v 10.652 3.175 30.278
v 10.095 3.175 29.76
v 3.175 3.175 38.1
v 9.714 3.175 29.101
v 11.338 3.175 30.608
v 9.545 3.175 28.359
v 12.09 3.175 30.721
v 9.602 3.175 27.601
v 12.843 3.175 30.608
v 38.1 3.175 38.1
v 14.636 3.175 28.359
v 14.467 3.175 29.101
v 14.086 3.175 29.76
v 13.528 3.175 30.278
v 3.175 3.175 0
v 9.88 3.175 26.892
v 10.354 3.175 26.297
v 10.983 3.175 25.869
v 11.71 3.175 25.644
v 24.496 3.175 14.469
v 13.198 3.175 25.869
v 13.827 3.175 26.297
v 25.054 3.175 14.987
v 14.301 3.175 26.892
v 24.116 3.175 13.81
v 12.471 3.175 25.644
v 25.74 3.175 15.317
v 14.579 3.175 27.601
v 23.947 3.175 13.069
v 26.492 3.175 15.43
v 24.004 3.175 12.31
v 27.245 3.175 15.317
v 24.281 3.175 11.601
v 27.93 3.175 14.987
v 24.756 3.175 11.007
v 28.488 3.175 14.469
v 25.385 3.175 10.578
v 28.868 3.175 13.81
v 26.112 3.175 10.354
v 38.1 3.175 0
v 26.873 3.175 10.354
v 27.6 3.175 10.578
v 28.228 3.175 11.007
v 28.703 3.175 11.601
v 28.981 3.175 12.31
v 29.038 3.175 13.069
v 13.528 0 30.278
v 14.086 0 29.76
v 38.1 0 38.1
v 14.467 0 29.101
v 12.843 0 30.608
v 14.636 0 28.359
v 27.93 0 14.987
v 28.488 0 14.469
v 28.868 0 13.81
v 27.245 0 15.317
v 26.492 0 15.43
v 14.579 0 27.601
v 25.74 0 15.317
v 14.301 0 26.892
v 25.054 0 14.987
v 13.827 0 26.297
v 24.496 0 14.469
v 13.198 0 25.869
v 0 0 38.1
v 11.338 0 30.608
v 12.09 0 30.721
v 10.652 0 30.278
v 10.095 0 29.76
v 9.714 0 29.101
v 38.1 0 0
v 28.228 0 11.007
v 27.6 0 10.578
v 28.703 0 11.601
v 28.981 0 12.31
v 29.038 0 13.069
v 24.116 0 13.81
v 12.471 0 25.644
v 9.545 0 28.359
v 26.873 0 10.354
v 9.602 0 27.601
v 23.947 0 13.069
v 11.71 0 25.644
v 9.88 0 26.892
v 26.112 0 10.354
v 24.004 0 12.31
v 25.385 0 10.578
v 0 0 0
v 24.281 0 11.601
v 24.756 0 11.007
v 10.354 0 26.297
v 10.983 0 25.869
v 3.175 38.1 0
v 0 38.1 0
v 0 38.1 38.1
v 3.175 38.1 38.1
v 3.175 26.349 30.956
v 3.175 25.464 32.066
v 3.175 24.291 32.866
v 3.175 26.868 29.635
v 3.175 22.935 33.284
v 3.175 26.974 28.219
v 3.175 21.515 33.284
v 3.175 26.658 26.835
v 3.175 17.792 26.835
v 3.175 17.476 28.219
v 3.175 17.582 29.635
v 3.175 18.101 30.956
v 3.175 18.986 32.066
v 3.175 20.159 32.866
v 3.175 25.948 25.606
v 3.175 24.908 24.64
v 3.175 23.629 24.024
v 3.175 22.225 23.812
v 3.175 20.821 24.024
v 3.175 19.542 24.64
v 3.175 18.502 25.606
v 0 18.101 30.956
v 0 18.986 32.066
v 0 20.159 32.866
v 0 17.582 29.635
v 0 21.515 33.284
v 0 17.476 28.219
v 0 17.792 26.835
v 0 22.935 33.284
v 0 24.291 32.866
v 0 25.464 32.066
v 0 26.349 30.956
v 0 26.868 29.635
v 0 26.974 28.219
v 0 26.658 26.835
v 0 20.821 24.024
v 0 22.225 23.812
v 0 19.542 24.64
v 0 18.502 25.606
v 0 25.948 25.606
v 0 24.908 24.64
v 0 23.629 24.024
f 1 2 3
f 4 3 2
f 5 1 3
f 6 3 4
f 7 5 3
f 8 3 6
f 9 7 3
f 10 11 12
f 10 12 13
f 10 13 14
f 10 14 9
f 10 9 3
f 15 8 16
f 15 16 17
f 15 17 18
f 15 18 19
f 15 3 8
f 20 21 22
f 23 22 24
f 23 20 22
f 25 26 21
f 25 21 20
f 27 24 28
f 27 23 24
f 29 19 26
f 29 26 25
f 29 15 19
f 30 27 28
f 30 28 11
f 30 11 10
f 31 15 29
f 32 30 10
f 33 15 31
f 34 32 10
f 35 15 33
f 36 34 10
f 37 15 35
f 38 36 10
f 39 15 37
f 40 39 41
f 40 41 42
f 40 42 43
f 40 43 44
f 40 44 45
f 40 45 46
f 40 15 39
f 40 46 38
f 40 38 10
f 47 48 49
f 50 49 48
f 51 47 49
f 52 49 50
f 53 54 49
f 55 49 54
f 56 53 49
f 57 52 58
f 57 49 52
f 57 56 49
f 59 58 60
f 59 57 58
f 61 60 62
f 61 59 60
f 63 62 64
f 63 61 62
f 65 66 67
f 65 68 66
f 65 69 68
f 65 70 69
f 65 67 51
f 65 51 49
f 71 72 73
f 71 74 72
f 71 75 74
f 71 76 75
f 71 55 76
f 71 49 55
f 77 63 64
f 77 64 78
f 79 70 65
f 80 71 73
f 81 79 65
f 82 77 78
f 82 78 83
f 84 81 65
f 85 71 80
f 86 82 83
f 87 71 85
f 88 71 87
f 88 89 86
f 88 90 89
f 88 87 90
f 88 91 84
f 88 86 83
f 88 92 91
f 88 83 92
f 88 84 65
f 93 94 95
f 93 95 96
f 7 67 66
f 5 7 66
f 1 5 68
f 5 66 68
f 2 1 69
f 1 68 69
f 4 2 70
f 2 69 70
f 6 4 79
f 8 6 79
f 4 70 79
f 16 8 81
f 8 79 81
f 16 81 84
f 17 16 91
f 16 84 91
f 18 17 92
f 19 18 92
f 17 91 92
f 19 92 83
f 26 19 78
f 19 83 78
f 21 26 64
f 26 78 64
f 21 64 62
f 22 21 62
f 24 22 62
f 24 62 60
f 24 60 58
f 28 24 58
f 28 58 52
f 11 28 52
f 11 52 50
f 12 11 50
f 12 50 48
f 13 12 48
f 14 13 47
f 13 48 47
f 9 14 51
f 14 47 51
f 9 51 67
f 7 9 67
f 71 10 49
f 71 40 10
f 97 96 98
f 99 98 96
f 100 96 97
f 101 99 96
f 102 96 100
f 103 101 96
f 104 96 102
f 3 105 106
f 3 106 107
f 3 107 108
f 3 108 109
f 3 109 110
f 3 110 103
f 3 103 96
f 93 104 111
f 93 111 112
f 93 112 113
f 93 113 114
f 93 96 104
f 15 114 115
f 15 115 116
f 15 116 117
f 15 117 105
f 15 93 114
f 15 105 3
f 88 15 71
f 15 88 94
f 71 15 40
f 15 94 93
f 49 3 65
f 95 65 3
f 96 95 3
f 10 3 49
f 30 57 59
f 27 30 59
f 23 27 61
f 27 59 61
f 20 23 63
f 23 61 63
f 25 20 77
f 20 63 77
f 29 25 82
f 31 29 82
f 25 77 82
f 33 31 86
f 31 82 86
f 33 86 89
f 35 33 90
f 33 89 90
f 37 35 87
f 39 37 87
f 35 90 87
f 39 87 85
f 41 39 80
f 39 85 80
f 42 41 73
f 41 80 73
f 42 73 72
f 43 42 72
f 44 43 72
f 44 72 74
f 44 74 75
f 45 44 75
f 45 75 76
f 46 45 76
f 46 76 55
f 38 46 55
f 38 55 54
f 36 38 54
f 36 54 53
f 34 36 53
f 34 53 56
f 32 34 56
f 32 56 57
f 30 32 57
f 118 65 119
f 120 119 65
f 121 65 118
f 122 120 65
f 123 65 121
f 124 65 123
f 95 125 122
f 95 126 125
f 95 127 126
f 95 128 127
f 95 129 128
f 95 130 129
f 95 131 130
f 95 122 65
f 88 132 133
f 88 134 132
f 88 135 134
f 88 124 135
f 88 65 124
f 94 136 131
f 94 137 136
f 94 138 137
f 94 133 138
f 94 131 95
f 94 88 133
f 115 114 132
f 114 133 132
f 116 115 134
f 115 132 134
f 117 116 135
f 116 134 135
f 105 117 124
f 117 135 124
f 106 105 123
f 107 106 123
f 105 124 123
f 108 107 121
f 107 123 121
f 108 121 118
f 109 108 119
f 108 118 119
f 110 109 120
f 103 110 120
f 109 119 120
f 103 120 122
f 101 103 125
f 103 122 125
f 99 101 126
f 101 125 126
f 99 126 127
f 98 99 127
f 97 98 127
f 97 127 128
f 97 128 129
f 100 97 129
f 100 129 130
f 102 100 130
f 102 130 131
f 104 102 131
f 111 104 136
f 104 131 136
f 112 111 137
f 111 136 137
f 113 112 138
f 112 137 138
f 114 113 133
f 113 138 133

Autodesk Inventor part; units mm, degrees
ref_plane "YZ Plane" through (0, 0, 0) normal (1, 0, 0) x (0, 1, 0)
ref_plane "XZ Plane" through (0, 0, 0) normal (0, 1, 0) x (-1, 0, 0)
ref_plane "XY Plane" through (0, 0, 0) normal (0, 0, 1) x (1, 0, 0)
sketch "Sketch1" plane through (0, 0, 0) normal (0, 0, 1) x (1, 0, 0)
  line L0 (0, 0) -> (0, 38.1)
  line L1 (0, 38.1) -> (3.175, 38.1)
  line L2 (3.175, 38.1) -> (3.175, 3.175)
  line L3 (3.175, 3.175) -> (38.1, 3.175)
  line L4 (38.1, 3.175) -> (38.1, 0)
  line L5 (38.1, 0) -> (0, 0)
  dimension "d0" = 38.1
  dimension "d1" = 3.175
extrude "Extrusion1" add sketch "Sketch1" along normal blind 38.1
sketch "Sketch2" plane through (3.175, 3.175, 0) normal (1, 0, 0) x (0, 0, -1)
  line L0 (0, 34.925) -> (-38.1, 34.925) projected
  line L1 (-38.1, 0) -> (-38.1, 34.925) projected
  line L2 (0, 0) -> (-38.1, 0) projected
  point P0 (0, -3.175)
  point P1 (-28.575, 19.05)
  dimension "d5" = 9.525
  dimension "d24" = 19.05
hole "Hole1" at (3.175, 22.225, 28.575) direction (-1, 0, 0) diameter 9.525 end through all
sketch "Sketch3" plane through (3.175, 3.175, 0) normal (0, 1, 0) x (1, 0, 0)
  line L0 (34.925, -38.1) -> (0, -38.1) projected
  line L1 (0, 0) -> (0, -38.1) projected
  line L2 (34.925, 0) -> (34.925, -38.1) projected
  point P0 (-3.175, 0)
  point P1 (8.9154, -28.1686)
  point P2 (23.3172, -12.8778)
  dimension "d13" = 9.9314
  dimension "d14" = 8.9154
  dimension "d15" = 25.2222
  dimension "d16" = 11.6078
hole "Hole2" at (12.0904, 3.175, 28.1686) at (26.4922, 3.175, 12.8778) direction (0, -1, 0) diameter 5.1054 end through all
properties part number "CLB_085_ClimberMountLBracket" material "Aluminum 6061"
